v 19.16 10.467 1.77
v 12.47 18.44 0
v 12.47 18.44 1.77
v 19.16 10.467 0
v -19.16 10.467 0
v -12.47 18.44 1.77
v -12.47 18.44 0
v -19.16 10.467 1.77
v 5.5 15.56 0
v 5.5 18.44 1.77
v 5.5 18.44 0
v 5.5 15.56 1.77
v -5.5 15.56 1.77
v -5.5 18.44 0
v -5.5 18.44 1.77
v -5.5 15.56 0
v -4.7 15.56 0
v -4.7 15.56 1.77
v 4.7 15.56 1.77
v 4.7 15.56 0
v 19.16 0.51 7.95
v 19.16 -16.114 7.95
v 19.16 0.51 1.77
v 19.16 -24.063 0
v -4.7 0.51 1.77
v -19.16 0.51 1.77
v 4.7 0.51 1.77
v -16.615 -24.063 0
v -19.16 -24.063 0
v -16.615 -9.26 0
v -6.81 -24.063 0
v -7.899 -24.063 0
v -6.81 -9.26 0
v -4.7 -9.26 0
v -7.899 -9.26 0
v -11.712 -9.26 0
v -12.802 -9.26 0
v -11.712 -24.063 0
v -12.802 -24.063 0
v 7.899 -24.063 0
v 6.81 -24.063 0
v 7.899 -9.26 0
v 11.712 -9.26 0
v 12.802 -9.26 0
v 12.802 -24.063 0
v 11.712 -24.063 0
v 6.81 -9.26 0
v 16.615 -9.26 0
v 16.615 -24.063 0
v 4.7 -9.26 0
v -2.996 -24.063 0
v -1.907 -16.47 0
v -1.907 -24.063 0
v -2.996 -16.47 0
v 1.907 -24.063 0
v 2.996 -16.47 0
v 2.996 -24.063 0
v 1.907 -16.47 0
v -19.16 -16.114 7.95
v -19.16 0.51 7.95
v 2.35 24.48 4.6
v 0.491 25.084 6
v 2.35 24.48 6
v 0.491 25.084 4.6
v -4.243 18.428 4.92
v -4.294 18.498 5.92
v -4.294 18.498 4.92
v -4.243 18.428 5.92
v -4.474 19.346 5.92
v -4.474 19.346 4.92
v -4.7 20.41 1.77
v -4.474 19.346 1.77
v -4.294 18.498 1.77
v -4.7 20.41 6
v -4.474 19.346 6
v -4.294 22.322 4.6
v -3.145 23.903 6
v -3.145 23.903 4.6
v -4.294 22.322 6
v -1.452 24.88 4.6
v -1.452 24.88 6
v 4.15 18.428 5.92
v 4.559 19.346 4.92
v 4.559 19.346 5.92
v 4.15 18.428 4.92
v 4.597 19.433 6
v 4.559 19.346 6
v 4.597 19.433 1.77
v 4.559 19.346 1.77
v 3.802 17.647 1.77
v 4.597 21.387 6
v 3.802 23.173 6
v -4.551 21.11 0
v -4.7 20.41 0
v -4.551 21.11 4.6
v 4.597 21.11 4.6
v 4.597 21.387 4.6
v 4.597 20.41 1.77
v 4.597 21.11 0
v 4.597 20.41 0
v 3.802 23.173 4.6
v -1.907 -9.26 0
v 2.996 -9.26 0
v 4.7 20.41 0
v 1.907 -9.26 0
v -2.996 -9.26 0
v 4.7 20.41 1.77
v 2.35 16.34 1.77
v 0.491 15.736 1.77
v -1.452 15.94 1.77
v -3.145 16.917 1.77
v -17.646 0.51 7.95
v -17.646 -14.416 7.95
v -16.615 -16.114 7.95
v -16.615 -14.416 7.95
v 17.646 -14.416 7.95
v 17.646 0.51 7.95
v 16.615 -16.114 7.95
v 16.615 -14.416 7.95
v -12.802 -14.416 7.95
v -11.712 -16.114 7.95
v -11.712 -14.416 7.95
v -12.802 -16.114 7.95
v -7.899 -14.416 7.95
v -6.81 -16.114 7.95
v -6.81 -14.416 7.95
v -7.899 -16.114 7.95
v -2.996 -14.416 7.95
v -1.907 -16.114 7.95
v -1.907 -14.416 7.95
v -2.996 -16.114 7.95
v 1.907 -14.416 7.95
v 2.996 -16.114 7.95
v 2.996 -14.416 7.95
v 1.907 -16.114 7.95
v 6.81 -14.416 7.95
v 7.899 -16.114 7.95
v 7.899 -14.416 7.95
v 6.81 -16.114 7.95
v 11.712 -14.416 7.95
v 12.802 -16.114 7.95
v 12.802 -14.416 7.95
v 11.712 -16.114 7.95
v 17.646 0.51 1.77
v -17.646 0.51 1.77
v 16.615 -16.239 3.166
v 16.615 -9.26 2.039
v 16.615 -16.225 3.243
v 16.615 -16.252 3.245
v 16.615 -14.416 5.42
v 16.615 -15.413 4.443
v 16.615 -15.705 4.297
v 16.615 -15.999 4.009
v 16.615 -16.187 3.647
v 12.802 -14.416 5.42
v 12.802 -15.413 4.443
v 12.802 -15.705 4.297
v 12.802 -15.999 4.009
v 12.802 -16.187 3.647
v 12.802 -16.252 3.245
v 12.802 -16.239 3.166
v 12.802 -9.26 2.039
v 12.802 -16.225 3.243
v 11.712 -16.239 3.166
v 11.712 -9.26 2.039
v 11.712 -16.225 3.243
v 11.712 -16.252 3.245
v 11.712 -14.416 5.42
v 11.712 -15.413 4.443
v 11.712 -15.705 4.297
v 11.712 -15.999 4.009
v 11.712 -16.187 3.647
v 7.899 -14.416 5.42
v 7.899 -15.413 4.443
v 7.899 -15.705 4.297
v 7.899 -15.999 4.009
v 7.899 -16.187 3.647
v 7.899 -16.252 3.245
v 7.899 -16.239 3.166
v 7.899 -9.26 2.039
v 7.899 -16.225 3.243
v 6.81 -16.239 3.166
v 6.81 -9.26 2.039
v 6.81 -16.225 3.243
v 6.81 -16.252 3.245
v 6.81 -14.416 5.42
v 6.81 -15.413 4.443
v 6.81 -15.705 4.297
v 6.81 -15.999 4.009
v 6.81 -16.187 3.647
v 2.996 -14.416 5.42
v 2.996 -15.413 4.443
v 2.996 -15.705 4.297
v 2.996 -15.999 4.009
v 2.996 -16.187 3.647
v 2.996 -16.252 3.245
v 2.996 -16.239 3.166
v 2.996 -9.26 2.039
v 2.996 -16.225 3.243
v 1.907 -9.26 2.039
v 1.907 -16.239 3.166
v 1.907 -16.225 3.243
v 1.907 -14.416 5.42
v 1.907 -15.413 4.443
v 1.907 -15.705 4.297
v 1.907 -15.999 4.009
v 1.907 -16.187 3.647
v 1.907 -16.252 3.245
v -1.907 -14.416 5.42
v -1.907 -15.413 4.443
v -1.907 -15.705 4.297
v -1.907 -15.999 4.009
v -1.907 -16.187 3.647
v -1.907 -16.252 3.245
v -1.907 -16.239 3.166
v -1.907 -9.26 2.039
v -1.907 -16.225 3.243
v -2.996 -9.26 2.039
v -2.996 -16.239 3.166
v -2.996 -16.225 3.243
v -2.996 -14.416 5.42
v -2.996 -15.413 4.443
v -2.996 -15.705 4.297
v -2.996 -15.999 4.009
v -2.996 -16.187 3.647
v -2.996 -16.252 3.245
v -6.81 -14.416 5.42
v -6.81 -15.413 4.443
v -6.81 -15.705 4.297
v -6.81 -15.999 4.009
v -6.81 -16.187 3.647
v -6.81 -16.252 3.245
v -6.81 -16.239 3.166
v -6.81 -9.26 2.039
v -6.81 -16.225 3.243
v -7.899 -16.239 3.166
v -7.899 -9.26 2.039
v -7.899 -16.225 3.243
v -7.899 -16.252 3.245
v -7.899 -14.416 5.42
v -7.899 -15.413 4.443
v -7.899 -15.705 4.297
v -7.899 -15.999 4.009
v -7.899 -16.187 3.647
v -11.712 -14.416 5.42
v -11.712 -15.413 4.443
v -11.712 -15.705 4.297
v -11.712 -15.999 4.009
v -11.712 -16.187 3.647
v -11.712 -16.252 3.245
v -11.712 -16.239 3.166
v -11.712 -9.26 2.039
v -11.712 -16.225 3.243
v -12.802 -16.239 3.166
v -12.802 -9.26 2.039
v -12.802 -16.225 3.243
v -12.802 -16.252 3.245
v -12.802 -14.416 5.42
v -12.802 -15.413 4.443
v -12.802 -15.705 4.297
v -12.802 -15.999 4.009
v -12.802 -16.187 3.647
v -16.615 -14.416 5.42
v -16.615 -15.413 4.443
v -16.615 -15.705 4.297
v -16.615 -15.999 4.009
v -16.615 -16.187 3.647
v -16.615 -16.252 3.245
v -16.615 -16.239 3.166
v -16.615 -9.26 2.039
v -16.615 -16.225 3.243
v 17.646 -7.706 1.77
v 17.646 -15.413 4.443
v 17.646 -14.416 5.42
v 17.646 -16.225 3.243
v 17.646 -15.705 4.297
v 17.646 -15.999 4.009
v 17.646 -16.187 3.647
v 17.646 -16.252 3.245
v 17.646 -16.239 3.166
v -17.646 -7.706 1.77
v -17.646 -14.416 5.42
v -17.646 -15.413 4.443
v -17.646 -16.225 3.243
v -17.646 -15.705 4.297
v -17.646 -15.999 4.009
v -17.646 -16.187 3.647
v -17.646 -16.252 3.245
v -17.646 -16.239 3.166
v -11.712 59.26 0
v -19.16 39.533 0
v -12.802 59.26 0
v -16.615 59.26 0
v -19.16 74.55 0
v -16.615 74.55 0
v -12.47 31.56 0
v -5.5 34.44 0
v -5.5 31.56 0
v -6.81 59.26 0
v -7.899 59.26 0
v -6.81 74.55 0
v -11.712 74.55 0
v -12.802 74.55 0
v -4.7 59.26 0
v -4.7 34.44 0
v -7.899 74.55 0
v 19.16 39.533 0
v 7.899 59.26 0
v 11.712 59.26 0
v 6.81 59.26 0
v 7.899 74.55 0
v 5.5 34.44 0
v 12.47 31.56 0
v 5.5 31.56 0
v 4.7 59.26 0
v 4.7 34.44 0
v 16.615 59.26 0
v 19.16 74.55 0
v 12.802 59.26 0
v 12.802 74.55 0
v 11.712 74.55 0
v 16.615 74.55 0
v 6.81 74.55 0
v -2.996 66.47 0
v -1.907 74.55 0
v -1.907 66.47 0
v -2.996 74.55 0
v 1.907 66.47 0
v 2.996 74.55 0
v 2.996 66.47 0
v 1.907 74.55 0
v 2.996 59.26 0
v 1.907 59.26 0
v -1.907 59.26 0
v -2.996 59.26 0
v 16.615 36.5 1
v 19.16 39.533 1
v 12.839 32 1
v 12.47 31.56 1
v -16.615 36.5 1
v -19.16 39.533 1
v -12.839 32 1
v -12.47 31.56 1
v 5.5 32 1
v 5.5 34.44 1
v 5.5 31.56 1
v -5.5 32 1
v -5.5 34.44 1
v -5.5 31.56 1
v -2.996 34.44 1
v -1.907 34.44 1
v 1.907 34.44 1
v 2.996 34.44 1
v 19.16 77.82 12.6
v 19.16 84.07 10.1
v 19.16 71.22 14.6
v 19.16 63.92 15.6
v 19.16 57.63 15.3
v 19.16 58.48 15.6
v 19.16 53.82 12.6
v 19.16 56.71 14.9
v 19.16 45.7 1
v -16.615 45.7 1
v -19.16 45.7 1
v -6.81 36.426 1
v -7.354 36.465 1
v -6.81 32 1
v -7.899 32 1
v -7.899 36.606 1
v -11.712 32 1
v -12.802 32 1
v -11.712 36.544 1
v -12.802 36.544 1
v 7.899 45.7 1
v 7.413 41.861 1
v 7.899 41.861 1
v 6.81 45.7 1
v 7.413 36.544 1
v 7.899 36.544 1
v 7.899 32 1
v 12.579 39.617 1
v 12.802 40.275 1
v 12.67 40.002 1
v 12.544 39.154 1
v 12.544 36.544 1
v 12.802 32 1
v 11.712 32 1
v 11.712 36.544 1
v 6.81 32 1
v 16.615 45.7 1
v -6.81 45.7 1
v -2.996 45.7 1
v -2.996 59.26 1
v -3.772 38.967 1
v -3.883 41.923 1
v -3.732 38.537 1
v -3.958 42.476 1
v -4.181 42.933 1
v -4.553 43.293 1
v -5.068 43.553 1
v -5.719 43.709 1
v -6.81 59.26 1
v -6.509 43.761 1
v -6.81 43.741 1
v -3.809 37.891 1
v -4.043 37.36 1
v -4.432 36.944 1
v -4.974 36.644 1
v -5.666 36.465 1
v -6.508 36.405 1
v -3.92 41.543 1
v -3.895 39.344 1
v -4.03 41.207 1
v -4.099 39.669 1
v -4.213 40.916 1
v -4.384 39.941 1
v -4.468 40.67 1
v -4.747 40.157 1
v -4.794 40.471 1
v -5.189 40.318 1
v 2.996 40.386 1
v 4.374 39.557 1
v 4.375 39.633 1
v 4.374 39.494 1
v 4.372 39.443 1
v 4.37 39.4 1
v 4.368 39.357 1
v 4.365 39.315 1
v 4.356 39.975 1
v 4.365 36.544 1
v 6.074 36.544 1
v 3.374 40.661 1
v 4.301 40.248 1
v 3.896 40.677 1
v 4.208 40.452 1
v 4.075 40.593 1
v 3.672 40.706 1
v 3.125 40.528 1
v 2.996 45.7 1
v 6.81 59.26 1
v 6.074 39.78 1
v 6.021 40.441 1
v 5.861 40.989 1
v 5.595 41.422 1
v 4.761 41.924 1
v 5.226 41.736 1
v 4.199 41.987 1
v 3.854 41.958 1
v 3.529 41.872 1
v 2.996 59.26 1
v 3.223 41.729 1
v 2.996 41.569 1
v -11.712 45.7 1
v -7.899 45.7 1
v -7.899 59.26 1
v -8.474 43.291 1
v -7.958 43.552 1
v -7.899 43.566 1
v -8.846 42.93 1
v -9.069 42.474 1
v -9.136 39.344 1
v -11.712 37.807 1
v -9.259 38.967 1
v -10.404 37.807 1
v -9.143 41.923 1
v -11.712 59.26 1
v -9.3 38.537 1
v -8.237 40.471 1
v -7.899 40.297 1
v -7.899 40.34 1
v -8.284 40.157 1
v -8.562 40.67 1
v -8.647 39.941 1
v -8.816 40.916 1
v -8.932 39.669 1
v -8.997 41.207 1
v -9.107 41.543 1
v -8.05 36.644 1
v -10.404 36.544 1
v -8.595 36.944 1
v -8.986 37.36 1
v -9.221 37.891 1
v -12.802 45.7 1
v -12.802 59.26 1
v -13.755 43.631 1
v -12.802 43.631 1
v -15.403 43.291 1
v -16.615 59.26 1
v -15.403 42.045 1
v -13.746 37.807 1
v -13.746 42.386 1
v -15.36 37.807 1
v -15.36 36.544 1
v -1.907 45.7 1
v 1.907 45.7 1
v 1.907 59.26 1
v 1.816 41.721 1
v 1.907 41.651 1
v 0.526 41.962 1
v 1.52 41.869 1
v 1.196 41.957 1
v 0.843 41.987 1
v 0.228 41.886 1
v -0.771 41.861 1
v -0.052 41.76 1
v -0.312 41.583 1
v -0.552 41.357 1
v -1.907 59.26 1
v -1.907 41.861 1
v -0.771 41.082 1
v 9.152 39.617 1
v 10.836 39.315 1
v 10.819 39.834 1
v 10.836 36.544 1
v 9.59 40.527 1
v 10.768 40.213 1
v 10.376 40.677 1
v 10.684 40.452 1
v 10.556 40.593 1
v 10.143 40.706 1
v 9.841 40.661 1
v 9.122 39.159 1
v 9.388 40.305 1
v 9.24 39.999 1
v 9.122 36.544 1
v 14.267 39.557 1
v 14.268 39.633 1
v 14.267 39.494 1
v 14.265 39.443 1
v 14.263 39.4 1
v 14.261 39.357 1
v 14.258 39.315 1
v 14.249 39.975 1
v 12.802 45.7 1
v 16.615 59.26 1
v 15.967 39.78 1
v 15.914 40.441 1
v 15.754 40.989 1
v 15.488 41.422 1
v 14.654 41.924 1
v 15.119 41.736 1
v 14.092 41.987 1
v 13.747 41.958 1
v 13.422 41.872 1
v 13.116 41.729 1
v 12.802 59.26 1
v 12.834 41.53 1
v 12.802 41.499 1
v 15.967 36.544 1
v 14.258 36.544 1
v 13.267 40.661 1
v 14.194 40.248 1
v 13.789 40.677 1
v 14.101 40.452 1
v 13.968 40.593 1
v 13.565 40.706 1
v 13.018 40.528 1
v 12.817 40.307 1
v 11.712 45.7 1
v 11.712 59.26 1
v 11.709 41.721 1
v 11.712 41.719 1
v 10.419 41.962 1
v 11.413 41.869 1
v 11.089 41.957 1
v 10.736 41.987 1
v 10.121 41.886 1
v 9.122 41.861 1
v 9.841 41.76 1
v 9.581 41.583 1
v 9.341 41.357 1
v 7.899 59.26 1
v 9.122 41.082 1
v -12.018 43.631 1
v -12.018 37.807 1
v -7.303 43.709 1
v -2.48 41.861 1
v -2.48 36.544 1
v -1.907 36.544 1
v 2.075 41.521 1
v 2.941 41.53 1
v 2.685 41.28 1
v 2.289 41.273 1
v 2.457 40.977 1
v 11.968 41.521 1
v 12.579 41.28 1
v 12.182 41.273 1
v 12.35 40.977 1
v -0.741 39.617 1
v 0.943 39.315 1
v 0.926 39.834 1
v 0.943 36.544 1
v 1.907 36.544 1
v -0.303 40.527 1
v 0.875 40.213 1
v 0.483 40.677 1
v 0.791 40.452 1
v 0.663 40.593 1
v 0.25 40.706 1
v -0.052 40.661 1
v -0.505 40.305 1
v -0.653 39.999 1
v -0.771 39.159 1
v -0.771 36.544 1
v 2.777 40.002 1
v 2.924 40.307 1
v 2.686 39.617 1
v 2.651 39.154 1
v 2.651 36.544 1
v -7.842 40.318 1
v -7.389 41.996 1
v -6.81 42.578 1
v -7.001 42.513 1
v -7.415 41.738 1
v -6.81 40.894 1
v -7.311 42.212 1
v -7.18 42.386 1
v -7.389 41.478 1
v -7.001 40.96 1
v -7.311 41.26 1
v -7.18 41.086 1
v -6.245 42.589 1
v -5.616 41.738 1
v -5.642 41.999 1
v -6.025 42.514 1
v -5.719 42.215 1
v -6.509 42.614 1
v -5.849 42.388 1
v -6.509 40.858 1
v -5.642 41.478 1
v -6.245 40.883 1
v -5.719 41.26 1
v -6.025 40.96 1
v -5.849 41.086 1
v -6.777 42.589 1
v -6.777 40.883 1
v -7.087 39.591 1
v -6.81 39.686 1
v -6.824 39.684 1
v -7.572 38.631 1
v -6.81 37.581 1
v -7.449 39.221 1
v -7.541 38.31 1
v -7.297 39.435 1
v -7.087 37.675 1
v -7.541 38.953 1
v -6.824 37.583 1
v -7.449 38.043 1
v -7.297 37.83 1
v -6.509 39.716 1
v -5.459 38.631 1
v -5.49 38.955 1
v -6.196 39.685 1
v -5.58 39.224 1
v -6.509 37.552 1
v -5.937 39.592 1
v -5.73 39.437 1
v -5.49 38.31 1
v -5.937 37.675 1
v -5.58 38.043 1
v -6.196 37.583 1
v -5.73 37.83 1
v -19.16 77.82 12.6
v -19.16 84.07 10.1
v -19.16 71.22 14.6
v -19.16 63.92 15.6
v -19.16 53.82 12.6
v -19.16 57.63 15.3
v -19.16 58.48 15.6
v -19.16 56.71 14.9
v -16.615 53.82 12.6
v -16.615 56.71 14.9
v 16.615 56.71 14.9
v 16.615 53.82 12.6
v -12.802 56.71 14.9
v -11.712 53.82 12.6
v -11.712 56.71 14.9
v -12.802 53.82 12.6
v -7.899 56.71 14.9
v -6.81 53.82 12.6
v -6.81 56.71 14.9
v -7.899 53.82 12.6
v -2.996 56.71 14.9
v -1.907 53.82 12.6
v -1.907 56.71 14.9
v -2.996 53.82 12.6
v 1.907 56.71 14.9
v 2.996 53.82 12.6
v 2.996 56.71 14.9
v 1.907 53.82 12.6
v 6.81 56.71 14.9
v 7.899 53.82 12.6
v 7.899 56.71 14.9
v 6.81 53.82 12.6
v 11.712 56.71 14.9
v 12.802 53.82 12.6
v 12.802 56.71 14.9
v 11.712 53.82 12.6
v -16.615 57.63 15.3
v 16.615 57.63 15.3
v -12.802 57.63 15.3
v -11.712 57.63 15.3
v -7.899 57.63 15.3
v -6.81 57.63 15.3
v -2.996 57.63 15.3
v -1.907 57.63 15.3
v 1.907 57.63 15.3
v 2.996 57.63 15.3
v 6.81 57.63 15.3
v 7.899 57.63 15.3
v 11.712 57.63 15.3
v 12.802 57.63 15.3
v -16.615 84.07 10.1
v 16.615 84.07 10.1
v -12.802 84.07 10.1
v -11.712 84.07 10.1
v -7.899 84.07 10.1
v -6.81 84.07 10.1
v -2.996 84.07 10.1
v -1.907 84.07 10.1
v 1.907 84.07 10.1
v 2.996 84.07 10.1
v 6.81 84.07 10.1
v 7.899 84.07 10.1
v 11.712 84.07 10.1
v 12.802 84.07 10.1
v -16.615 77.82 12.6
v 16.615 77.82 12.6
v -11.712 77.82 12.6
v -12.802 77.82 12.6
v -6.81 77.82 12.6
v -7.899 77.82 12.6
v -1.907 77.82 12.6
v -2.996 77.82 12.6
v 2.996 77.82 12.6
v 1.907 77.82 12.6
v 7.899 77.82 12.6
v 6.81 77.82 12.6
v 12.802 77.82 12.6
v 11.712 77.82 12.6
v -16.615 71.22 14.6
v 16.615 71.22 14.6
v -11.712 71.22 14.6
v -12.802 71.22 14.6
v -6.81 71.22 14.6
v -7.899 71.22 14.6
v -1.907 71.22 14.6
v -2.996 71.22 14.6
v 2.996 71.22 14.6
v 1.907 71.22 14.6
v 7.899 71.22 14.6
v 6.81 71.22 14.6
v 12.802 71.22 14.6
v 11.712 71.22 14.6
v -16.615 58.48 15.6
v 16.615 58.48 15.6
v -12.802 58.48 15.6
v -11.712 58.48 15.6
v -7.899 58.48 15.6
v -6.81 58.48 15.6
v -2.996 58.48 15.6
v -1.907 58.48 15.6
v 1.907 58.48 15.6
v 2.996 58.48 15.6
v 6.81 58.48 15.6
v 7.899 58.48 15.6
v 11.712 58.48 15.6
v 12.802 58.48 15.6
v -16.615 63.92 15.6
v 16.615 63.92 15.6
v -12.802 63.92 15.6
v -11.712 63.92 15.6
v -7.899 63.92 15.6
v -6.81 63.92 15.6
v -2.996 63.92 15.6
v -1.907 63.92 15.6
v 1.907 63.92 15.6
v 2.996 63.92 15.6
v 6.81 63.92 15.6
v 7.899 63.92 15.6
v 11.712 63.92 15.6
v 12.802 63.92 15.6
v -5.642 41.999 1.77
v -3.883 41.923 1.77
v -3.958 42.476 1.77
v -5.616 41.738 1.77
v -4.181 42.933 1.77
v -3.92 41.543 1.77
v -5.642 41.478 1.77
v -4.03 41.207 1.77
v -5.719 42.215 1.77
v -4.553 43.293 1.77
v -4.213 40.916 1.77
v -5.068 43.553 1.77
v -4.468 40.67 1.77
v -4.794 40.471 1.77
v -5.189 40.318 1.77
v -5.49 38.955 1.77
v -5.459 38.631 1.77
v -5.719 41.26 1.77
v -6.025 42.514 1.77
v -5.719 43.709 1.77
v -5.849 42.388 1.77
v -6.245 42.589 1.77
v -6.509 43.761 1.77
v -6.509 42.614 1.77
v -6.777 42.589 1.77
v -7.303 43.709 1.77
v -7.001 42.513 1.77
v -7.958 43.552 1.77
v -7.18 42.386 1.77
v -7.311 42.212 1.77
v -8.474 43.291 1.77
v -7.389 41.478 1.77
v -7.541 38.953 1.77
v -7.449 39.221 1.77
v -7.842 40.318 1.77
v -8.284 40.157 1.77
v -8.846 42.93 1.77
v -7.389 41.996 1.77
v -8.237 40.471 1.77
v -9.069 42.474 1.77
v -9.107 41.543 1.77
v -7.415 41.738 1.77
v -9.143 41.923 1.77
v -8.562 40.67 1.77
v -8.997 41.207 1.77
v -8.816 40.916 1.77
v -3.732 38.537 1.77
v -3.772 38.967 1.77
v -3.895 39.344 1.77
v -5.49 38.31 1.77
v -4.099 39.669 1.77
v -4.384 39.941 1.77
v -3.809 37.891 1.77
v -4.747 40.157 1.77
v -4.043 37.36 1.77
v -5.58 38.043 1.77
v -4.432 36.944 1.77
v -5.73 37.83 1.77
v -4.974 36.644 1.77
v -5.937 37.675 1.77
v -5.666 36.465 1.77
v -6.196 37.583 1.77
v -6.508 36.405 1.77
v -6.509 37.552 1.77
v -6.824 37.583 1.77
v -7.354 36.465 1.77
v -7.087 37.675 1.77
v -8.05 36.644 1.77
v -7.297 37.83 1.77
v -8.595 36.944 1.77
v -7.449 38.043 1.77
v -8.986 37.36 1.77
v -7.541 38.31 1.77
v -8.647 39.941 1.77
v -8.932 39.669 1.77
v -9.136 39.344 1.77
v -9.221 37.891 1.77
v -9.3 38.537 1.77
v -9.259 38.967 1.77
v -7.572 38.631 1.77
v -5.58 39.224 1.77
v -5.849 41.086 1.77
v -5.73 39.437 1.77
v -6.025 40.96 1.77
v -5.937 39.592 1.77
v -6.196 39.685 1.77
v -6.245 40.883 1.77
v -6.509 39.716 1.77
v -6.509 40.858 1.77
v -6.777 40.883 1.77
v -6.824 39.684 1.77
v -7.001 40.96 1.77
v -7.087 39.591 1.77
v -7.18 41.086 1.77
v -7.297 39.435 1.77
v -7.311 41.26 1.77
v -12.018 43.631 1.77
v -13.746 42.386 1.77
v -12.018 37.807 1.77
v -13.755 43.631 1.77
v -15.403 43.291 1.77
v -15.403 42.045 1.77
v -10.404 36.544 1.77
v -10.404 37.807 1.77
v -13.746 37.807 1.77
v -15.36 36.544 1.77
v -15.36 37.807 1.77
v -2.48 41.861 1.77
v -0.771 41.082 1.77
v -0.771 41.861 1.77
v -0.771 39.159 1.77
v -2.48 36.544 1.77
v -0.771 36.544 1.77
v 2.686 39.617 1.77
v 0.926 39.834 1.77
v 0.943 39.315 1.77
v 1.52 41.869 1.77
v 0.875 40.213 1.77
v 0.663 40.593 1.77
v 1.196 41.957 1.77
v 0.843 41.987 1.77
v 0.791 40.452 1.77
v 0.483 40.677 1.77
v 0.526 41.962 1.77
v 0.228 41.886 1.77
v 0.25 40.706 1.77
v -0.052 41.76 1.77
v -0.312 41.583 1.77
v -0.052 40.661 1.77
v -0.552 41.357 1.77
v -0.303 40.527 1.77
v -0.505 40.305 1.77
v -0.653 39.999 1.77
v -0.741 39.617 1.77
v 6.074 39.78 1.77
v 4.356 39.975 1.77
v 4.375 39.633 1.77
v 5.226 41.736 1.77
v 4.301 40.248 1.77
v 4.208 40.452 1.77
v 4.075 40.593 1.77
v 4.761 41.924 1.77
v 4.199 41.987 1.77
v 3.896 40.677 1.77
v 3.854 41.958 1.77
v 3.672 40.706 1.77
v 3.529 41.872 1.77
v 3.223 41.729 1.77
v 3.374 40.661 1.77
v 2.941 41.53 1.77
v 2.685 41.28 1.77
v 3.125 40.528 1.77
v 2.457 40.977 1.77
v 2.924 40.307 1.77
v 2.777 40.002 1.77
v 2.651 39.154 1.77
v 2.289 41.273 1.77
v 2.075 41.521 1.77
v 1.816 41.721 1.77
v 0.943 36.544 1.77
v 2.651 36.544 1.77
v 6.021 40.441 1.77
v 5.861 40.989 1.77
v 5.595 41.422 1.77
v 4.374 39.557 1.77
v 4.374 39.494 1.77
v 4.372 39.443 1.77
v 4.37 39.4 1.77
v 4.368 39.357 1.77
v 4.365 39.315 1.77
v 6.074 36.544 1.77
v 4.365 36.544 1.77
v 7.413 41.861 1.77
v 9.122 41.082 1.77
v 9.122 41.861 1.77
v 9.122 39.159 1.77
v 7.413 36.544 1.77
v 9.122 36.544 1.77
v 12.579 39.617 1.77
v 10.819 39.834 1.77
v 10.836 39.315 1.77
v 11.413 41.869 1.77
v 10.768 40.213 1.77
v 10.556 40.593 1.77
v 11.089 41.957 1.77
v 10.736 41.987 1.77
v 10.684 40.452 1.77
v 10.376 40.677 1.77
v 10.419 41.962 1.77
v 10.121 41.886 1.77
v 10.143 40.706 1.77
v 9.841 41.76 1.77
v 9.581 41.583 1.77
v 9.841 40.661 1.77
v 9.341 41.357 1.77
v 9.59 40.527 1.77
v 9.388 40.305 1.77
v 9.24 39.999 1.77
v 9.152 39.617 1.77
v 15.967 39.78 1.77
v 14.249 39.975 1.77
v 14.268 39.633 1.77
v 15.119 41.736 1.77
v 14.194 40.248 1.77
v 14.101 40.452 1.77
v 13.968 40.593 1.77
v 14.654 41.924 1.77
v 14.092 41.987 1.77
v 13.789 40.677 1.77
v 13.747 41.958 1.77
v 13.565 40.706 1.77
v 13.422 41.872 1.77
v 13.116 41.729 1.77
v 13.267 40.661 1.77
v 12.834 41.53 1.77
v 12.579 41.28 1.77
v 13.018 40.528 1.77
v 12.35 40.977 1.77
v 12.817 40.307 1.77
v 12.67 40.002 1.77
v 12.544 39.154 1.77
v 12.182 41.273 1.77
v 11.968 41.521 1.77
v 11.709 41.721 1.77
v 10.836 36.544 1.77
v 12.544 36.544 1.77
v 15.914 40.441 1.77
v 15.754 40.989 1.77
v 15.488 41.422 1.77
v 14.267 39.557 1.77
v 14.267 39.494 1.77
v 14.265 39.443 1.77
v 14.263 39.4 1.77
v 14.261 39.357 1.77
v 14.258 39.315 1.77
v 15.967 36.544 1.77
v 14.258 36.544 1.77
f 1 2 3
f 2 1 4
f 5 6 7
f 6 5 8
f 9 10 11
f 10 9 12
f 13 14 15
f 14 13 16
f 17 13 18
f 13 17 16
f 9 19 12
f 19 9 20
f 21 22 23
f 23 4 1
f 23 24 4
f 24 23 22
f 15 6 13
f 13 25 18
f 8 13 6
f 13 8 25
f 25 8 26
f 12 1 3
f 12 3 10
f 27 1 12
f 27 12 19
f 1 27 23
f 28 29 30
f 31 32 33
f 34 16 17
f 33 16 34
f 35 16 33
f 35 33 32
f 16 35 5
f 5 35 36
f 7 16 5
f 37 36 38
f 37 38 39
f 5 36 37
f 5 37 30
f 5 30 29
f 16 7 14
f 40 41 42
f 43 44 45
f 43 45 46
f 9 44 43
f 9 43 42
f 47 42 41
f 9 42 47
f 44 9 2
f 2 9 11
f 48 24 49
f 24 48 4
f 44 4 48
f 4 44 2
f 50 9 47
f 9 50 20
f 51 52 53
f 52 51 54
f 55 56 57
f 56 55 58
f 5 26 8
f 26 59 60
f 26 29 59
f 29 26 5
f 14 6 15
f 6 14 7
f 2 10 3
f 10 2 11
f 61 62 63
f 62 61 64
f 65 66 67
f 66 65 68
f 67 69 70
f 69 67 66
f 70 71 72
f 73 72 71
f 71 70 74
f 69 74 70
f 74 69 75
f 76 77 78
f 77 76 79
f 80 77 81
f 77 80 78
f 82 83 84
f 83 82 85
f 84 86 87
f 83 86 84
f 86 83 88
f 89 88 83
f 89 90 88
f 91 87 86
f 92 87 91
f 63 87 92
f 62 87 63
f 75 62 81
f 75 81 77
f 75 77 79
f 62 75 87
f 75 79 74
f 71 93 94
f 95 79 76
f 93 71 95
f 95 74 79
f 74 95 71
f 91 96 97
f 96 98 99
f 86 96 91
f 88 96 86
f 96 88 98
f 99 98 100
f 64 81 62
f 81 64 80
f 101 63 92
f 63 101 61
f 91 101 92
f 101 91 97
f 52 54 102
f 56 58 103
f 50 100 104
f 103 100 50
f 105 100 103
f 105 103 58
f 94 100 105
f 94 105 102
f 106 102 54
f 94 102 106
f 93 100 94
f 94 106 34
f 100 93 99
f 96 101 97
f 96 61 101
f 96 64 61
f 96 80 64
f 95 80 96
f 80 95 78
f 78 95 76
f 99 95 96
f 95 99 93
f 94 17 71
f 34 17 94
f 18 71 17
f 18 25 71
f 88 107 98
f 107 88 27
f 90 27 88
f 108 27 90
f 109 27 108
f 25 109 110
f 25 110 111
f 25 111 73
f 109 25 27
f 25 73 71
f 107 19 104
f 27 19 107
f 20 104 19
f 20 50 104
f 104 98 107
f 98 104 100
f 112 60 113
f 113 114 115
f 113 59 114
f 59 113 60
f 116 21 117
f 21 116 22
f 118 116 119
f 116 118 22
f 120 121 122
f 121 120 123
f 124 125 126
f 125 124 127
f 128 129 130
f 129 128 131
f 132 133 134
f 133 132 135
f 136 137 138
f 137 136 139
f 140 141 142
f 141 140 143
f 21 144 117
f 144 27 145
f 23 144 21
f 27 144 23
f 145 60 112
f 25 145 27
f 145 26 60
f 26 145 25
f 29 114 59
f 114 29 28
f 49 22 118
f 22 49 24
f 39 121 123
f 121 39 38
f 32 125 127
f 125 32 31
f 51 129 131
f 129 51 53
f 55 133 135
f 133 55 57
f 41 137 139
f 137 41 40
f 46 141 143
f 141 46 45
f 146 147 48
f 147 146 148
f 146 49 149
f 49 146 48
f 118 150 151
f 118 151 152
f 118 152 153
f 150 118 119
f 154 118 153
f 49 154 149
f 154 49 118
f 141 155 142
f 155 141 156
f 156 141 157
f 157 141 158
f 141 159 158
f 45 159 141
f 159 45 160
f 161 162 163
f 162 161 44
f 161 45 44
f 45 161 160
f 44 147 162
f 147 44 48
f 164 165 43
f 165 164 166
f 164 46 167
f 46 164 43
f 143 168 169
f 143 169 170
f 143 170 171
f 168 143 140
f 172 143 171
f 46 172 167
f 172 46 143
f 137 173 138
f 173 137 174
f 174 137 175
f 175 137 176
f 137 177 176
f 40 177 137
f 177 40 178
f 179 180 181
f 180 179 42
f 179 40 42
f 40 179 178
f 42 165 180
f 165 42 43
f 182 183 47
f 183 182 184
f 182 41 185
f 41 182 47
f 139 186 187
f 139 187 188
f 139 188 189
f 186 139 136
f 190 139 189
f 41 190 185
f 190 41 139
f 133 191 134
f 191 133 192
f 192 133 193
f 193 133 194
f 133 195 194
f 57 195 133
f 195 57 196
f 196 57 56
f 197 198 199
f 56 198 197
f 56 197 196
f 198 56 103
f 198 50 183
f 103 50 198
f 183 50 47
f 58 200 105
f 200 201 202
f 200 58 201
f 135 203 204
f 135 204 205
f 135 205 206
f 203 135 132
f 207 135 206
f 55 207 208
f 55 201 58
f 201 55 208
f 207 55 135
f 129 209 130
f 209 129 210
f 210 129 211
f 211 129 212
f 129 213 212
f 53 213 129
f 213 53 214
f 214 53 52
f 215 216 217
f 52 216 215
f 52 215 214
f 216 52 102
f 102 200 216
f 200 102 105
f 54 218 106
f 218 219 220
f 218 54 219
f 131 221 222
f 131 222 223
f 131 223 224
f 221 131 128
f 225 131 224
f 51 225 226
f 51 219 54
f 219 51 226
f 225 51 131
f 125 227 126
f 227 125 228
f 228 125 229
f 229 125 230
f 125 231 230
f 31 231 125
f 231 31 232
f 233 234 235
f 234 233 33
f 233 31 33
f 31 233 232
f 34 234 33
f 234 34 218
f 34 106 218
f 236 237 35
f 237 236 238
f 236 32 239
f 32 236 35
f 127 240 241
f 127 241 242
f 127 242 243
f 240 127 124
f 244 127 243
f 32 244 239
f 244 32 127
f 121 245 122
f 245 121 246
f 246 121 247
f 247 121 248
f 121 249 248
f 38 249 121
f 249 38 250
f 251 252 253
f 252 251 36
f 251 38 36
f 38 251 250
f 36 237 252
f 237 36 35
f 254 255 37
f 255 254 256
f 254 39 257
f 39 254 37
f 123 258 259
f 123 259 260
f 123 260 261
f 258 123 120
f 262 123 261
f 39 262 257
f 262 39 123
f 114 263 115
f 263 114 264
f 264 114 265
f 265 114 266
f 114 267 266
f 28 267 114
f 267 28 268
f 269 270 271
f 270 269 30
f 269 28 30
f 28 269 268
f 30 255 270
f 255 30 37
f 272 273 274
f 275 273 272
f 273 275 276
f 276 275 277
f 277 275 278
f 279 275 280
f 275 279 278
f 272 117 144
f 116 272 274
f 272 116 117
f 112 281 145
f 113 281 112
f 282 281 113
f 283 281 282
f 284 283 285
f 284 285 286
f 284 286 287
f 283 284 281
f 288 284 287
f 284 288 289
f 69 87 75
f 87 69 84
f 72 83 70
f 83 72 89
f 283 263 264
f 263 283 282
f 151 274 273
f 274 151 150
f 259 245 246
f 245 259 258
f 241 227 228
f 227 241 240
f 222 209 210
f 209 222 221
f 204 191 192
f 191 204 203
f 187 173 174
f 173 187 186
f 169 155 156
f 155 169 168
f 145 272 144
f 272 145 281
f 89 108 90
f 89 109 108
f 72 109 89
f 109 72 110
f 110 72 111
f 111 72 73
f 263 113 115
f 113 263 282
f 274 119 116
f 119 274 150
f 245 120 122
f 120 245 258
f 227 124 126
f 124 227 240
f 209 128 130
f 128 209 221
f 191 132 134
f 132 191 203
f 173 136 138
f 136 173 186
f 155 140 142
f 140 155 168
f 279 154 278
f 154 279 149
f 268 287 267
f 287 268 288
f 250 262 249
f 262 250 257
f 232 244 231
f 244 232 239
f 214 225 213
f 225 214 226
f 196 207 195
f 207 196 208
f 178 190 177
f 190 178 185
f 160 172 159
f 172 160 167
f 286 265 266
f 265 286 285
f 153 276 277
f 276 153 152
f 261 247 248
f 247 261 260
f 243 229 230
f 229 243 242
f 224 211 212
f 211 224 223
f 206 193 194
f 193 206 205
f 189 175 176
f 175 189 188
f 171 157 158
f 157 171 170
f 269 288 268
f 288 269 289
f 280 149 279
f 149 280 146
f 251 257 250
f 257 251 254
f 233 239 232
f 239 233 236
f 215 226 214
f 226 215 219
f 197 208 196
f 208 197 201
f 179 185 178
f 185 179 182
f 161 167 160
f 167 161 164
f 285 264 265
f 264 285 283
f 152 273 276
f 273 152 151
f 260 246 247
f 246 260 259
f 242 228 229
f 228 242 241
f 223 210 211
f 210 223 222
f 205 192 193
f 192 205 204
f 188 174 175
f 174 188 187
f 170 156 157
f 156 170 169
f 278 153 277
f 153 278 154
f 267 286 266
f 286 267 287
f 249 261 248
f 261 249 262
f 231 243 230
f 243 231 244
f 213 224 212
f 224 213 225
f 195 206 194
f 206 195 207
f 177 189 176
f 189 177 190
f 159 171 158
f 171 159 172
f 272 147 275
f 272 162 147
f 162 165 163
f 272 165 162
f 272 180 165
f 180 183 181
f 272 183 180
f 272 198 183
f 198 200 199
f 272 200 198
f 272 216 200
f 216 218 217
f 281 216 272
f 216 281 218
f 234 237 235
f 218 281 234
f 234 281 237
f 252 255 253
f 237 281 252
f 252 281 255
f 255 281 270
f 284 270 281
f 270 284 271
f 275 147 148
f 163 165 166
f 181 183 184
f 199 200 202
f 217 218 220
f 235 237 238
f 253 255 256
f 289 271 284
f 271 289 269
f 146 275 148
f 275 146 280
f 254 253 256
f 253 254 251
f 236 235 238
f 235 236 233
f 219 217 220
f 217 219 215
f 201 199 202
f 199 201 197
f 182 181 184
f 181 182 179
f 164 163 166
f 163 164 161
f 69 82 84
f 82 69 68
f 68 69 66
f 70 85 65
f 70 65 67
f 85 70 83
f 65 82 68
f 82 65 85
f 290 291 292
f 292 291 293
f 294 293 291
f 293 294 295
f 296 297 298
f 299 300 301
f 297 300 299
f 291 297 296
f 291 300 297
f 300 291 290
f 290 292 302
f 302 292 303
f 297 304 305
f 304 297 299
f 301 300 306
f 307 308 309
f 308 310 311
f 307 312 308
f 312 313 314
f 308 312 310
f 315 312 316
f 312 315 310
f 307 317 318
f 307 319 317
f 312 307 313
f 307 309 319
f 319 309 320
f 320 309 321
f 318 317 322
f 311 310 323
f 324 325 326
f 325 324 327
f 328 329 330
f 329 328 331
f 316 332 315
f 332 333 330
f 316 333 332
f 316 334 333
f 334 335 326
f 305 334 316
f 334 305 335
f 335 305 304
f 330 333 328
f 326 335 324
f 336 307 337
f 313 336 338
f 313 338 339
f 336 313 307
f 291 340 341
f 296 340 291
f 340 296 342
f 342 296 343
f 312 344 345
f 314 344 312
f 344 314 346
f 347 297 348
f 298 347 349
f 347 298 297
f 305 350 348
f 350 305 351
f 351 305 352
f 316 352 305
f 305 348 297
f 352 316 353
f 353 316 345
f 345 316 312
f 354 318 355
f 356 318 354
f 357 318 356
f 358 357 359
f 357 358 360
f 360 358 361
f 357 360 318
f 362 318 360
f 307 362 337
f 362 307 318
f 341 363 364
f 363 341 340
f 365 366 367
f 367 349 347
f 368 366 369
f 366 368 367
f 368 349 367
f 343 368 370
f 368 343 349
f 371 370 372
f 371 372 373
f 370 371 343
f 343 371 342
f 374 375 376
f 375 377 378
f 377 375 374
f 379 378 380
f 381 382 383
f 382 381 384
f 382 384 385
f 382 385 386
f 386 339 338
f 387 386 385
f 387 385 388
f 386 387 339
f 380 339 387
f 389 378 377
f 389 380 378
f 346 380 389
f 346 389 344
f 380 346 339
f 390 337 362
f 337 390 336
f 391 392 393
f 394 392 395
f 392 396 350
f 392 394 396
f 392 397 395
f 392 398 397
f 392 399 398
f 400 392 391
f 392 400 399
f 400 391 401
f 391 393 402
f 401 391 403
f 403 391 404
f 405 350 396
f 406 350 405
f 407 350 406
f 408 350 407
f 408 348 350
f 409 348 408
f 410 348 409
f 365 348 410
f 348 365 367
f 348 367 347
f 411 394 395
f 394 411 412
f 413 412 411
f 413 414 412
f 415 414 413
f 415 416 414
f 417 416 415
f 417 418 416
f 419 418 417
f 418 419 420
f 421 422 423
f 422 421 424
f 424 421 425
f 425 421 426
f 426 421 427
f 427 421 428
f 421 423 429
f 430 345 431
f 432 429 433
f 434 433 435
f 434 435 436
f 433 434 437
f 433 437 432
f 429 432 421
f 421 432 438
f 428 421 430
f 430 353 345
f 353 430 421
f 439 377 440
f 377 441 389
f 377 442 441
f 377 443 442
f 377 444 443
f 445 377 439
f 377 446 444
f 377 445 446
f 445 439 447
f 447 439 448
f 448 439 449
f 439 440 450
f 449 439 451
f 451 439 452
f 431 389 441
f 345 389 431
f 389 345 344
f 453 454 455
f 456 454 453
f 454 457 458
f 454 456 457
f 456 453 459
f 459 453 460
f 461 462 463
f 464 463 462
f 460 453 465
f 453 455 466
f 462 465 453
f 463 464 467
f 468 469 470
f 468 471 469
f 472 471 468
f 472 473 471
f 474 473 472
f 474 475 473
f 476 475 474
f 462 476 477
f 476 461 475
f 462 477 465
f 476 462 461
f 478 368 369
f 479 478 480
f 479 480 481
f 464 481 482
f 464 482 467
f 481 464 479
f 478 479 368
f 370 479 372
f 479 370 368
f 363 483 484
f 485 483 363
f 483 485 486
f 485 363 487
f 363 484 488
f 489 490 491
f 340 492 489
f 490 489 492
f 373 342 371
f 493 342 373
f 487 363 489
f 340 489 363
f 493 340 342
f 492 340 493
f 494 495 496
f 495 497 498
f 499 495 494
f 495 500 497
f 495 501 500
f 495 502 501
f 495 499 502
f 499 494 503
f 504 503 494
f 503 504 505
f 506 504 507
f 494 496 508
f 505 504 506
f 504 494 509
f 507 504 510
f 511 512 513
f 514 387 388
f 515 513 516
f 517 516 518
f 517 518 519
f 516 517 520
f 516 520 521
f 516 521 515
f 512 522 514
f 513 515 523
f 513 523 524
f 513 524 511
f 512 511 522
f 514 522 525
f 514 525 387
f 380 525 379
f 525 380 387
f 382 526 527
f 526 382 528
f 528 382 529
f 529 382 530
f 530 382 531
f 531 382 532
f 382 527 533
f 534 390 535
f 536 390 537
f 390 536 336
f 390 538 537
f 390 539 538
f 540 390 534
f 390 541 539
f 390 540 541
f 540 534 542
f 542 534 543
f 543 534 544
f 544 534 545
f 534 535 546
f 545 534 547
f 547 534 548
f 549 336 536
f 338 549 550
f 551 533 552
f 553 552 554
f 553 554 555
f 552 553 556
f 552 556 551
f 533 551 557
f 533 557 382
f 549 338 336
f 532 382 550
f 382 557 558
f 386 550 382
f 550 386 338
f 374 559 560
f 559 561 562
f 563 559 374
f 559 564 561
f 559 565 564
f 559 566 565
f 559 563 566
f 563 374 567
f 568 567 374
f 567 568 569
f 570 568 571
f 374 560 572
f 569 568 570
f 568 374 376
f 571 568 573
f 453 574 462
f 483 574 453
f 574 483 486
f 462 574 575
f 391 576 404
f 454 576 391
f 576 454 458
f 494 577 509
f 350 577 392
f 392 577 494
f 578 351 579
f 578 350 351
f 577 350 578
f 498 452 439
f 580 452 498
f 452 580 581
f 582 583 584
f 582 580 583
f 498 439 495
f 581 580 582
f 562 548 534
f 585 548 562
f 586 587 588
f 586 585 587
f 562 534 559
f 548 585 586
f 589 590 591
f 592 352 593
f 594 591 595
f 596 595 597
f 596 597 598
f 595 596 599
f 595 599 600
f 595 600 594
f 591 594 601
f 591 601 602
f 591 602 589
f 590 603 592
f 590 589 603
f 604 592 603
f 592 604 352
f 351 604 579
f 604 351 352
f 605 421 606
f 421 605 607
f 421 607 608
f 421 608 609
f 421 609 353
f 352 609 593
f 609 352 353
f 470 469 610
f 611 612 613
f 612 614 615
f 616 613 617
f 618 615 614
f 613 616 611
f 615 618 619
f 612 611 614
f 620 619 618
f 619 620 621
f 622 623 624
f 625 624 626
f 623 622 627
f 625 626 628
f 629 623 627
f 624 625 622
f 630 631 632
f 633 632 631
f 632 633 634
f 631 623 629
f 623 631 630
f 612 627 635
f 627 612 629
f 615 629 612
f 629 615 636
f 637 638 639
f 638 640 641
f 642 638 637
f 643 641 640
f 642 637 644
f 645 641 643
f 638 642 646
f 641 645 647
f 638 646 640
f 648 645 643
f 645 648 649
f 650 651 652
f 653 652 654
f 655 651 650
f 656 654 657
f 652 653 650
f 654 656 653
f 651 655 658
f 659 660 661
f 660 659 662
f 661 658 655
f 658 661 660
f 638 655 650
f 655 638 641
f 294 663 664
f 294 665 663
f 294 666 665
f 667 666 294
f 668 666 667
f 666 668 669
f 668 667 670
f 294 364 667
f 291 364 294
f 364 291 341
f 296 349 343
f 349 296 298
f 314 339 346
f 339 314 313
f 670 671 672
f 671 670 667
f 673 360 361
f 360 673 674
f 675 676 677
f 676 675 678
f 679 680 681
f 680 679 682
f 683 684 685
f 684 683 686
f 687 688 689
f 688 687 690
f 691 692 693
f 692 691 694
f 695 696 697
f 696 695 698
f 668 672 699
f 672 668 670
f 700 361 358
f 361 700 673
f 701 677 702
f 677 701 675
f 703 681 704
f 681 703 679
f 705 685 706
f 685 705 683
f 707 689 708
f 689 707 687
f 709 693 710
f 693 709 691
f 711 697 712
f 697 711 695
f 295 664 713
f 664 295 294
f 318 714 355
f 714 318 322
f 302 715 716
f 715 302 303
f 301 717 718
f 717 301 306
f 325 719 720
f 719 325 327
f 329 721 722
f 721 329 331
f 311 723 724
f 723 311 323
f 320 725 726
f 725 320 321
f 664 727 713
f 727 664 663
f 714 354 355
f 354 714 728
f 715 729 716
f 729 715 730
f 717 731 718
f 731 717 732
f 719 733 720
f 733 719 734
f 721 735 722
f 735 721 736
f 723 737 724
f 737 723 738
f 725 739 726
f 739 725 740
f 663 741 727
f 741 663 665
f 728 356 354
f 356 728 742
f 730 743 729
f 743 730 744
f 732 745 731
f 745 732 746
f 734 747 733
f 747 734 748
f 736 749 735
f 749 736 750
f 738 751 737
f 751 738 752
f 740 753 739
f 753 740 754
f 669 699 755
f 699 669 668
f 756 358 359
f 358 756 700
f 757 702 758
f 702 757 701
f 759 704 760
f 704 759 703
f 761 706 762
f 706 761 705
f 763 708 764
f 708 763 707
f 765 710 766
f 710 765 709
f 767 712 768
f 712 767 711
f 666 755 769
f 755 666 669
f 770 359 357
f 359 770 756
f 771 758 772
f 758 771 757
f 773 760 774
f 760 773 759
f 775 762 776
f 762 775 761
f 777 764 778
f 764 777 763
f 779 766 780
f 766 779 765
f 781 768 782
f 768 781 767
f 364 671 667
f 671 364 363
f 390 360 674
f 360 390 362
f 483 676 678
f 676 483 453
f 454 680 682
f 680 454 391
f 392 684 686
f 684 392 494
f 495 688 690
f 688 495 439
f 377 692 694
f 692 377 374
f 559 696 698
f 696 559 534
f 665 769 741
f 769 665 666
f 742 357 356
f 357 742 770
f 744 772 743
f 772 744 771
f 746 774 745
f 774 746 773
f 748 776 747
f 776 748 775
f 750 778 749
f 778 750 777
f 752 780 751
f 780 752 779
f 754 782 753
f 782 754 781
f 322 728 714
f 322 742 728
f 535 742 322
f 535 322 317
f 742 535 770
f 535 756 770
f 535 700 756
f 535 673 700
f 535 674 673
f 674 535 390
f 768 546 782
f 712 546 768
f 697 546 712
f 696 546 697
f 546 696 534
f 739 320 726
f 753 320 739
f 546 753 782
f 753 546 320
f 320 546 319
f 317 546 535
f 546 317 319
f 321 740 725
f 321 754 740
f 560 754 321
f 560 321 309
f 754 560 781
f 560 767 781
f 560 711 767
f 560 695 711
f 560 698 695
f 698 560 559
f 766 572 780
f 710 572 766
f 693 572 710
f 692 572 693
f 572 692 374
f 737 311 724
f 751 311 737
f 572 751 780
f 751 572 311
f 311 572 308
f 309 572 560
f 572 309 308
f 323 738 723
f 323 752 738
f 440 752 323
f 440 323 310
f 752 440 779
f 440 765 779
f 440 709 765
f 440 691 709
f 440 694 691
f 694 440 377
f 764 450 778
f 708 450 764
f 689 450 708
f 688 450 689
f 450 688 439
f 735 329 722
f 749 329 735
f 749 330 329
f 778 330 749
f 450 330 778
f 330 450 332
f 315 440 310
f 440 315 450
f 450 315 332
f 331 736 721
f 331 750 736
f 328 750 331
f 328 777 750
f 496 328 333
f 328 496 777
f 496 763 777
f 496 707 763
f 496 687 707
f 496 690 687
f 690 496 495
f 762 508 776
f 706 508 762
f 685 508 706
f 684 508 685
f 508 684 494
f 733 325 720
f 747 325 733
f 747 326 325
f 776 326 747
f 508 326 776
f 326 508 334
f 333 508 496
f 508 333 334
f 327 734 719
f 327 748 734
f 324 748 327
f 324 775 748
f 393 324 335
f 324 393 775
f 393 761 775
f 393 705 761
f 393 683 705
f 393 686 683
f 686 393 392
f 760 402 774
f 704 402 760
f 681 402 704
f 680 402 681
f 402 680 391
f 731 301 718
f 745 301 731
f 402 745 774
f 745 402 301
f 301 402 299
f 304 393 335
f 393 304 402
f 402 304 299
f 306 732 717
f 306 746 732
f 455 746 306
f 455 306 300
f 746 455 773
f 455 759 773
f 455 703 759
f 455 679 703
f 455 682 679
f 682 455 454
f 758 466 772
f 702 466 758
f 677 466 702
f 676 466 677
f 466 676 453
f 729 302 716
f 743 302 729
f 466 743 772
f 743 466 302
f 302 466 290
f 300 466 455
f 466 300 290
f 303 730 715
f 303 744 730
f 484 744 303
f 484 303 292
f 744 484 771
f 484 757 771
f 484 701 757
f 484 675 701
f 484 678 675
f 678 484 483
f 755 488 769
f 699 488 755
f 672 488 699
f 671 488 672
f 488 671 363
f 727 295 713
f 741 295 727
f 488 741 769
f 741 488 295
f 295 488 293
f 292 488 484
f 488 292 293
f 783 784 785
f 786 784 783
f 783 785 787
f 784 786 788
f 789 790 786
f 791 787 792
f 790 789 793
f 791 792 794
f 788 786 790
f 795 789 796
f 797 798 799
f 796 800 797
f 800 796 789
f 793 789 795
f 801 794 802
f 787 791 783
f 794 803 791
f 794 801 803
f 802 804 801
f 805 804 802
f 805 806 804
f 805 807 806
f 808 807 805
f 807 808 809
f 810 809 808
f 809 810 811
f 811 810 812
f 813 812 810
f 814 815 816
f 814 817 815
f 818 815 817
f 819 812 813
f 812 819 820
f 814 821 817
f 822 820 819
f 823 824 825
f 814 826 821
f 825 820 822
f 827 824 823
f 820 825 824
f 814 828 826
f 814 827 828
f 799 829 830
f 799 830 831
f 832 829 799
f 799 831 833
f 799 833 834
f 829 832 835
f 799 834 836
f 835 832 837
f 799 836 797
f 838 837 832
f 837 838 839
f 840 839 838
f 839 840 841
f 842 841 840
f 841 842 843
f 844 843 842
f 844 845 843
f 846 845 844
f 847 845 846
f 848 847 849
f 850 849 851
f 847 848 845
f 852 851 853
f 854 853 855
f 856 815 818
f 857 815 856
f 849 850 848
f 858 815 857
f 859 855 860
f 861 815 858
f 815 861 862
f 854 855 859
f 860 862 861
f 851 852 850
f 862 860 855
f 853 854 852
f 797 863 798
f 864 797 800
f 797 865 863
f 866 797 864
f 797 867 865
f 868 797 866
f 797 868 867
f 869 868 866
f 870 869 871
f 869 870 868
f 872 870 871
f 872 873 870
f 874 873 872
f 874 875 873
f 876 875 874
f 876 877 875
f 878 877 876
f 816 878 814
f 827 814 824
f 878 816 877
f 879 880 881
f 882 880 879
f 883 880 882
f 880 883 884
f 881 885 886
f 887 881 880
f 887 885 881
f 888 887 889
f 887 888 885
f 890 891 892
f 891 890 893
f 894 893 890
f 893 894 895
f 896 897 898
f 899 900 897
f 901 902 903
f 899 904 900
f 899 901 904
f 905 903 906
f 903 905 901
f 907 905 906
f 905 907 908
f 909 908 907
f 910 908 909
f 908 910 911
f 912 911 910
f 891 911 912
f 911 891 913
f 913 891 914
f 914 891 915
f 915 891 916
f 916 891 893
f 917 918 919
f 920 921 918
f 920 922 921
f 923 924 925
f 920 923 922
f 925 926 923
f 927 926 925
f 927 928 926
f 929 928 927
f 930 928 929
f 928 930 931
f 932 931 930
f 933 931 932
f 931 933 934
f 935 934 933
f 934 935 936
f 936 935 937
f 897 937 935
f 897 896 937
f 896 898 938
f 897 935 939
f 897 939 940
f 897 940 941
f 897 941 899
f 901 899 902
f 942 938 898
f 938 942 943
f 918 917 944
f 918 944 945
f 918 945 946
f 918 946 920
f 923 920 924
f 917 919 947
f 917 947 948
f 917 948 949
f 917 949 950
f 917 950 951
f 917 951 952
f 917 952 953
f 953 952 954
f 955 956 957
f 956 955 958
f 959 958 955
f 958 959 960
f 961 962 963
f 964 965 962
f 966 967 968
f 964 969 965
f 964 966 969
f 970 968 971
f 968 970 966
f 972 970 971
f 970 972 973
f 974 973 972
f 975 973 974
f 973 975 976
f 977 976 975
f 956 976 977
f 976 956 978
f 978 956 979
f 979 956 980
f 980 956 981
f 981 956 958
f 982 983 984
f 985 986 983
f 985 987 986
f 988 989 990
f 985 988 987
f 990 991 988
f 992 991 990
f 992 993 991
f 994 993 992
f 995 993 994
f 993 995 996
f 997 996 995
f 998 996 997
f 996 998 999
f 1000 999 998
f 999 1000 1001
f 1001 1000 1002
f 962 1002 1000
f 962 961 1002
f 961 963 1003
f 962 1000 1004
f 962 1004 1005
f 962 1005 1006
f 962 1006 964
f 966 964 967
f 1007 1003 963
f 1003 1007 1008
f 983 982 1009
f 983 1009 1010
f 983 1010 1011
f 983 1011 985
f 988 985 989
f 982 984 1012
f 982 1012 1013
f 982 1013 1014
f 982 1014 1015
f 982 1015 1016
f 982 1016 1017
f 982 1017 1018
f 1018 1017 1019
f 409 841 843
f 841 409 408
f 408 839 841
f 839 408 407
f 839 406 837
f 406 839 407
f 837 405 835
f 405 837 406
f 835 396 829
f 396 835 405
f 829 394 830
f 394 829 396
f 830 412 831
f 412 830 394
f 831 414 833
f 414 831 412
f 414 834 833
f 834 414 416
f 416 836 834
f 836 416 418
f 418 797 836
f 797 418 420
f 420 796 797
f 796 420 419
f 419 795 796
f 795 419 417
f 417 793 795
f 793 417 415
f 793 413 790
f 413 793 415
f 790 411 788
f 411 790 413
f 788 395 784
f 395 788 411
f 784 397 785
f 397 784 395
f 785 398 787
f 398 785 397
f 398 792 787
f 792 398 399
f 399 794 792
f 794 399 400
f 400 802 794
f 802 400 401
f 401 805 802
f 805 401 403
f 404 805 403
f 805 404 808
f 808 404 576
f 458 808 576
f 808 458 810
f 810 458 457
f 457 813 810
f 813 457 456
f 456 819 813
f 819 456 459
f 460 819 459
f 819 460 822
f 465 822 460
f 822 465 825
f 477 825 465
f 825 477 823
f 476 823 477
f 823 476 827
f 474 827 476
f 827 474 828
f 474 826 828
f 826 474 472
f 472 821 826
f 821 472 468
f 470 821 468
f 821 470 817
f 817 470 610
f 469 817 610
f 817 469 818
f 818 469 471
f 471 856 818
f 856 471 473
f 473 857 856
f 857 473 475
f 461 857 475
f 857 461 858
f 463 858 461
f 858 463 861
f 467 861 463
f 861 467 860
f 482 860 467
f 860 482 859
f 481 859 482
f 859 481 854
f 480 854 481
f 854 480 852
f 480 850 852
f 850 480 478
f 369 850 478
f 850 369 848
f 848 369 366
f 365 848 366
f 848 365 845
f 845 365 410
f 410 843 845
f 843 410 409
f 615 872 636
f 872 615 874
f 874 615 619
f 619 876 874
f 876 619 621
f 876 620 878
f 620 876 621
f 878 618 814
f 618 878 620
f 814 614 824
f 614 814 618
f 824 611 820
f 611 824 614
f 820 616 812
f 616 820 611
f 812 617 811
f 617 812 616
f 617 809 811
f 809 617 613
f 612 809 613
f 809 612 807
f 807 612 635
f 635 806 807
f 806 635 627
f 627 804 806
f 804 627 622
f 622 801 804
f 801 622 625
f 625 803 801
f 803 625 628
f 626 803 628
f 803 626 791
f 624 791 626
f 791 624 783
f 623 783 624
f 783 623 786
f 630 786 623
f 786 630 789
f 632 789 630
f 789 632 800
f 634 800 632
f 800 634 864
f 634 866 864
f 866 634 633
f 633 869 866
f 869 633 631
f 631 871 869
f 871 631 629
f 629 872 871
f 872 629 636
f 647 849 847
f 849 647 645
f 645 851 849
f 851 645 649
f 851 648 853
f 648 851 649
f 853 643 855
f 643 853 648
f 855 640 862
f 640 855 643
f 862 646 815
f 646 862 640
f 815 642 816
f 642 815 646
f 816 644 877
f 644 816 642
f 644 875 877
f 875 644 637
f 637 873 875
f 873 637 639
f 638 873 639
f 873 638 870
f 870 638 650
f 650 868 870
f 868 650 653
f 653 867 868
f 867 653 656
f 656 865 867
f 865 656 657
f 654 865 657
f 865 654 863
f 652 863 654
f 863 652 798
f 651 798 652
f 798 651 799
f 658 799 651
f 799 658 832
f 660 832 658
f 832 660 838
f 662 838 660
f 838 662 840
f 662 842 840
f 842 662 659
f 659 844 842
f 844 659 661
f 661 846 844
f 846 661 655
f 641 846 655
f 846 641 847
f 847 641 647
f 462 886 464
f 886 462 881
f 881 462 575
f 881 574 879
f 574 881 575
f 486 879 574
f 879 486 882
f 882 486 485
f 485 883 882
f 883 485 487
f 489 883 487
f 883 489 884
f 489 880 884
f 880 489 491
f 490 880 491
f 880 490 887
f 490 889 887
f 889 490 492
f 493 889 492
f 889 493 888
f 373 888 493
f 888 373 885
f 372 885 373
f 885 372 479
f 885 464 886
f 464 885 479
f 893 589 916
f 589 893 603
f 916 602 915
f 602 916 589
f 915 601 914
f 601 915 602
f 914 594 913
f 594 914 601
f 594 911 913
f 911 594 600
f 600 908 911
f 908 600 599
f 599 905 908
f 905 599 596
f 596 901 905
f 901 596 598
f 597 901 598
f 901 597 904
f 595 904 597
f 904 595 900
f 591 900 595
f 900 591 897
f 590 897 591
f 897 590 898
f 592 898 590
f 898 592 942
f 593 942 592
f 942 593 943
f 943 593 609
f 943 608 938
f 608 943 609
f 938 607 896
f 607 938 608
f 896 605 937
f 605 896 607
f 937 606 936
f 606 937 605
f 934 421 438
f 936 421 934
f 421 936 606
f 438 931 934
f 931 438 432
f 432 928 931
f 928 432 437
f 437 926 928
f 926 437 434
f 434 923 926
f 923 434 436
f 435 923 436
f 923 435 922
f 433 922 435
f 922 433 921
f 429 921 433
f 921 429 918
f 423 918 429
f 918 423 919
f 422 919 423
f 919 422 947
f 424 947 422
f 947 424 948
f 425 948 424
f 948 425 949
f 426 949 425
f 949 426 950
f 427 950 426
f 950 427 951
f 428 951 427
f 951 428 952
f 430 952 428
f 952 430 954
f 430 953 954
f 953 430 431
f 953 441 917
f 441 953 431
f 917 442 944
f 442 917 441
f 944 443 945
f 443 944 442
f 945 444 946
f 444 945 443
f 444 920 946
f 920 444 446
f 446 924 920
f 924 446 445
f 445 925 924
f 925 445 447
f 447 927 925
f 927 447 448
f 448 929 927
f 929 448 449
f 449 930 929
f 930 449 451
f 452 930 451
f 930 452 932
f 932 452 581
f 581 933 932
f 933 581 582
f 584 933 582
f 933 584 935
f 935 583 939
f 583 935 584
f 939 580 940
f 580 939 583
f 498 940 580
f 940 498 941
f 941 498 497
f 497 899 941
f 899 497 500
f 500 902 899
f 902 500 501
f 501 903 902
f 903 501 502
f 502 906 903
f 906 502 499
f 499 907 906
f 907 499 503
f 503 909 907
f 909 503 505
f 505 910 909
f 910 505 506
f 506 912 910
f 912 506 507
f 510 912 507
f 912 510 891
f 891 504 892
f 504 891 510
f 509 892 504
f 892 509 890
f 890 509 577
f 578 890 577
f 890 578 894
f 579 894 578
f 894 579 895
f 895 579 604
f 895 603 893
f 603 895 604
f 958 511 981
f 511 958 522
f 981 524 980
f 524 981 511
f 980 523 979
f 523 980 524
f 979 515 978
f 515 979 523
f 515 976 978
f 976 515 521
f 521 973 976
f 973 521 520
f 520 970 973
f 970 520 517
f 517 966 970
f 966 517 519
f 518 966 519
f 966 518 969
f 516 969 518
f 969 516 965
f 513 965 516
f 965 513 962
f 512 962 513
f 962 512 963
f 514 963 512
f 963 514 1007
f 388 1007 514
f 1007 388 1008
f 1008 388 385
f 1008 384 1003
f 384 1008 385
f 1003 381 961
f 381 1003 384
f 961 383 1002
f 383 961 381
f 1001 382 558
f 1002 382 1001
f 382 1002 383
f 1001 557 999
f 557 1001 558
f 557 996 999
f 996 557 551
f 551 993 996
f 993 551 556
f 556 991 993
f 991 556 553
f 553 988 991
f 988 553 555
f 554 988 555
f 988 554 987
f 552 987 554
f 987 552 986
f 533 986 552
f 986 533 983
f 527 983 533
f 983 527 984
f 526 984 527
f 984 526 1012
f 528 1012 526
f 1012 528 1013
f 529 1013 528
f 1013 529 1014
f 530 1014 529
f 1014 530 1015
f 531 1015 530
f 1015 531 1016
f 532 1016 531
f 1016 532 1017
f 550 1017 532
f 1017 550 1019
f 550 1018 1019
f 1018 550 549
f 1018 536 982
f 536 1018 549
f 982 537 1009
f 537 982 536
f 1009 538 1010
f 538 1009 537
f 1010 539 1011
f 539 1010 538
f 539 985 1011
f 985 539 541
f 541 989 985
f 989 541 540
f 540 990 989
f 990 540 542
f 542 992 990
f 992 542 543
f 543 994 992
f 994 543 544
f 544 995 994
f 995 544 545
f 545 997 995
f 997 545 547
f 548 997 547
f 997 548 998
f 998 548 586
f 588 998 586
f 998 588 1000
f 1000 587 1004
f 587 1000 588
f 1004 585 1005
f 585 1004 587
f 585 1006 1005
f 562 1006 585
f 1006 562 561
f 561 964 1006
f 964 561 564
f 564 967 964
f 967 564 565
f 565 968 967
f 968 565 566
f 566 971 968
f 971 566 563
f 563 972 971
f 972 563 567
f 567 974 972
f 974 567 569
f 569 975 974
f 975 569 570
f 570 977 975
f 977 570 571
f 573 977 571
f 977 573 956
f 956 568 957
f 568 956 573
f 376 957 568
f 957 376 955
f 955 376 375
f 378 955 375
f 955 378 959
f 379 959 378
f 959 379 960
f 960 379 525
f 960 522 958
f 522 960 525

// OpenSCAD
// A parametric guard for the Trym beard trimmer. The largest guard it comes with is 9mm which is
// not enough mms. This lets to have as many mms as you desire.
//
// First OpenSCAD project. Kind of a mess.

// The length to cut the hair in millimeters (measure twice, cut once though)
guard_height = 18;

/* Hidden */

base_width = 38.32;
base_length = 27.70+9.18;
base_thickness = 1.77;

base_notch_width= 11;
base_notch_length = 2.88;

root_width = 26.95;
root_height = 7.95-1.77+base_thickness;

module base_chamfer(dir) {
  translate([dir * (base_width/2), base_length/2, 0])
    rotate(a=dir*40, v=[0,0,1])
    cube([10.25, 10.25*2, base_thickness*2], center=true);
}


// Trym Guard Base
module trym_guard_base() {
  module base_core() {

    difference() {
      cube([base_width, base_length, base_thickness], center=true);
      union() {
        base_chamfer(1);
        base_chamfer(-1);
        translate([0, base_length/2, 0])
          cube([base_notch_width, base_notch_length*2, base_thickness*2], center=true);
      }
    }
  }

  module lock_tab() {
    lock_tab_offset = 1.97;
    lock_tab_width = 9.4;
    riser_length = 1.4;
    riser_height = 6.0;
    latch_sides = 1.25;

    translate([lock_tab_width/2, base_length/2+lock_tab_offset, -base_thickness/2])
      rotate(a=180, v=[0, 0, 1]) {
        cube([lock_tab_width, base_length, base_thickness]);
        difference() {
          translate([lock_tab_width/2, 0, 0]) cylinder(h=riser_height, d=lock_tab_width);
          union() {
            //translate([0, riser_length, base_thickness])
            //  cube([lock_tab_width, lock_tab_width, riser_height*2]);
            translate([0, -lock_tab_width-0.7, 0])
              cube([lock_tab_width, lock_tab_width, riser_height-riser_length]);
          }
        }
      }
  }

  module teeth_guard() {
    difference() {
      translate([0, -base_length/2 + root_width/2 - 8, -base_thickness/2+root_height/2])
        cube([base_width, root_width, root_height], center=true);
      union() {
        translate([0, -base_length/2-2, base_thickness/2+root_height/2+3.5])
          rotate(a=45, v=[1, 0, 0])
          cube([base_width, root_width, root_height], center=true);
      }
    }
  }

  translate([0, 0, base_thickness/2]) {
    difference() {
      union() {
        base_core();
        lock_tab();
        teeth_guard();
      }
      union() {
        for(i=[0:6]) {
          tooth_area_width = base_width-4;
          translate([tooth_area_width/2 - tooth_area_width/7*i - tooth_area_width/7/2, -base_length/2, root_height/2-base_thickness/2]) 
            cube([tooth_area_width/9, 9.18*2, 50], center=true);
        }
      }
    }
  }
}

head_length = 34.6;
head_width = 34.6;
head_thickness = 2.65;
module trym_head() {
  difference() {
    union() {
      translate([0, 1.1/4, 0]) cube([head_width, head_length-1.1/2, head_thickness], center=true);
      difference() {
        translate([0, 0.25, head_thickness/2+1/2])
          cube([head_width, head_length-0.5, 1], center=true);
        translate([-head_width/2, -head_length/2+0.5, head_thickness/2])
          rotate(a=45, v=[1, 0, 0])
          cube([head_width, 3, 3]);
      }
      translate([0, 0.75, head_thickness/2+1+10]) cube([head_width, head_length-1.5, 20], center=true);
      translate([0, -head_length/2 + 1, 0.15]) rotate(a=90, v=[0, 1, 0]) cylinder(d=2.6, h=head_width, center=true, $fn=20);
    }
    union() {
      translate([0, -head_length/2-0.3, 0])
        rotate(a=-10, v=[1, 0, 0])
        translate([-head_width/2, 0, -head_thickness-0.2])
        cube([head_width, 8.47+0.4, 3]);
      notch_depth = 0.9;
      notch_width = 9.5;
      translate([0, head_width/2-notch_depth/2, head_thickness/2+1]) cube([notch_width, notch_depth, 1], center=true);
    }
  }
}

module trym_base() {
  difference() {
    trym_guard_base();
    translate([0, 1.7, base_thickness + head_thickness/2])
      scale([1.02, 1.02, 1]) // wiggle room on the sides
      trym_head();
  }
}

module trym_teeth(height) {
  adjusted_height=height-2.4;
  rotate(a=180, v=[1, 0, 0])
    difference() {
      union() {
        difference() {
          union() {
            guard_base_length = 32;
            translate([0,5,0])
              rotate(a=90, v=[0, 0, 1])
              rotate(a=90, v=[1, 0, 0]) 
              translate([0,0,-base_width/2])
              linear_extrude(height=base_width) {
                // The "0.7" is the skew value; pushed along the y axis
                M = [ [ 1, 0.7, 0],
                  [ 0, 1, 0],
                  [ 0, 0, 1] ] ;
                multmatrix(M)
                  polygon([[0,0],
                      [-guard_base_length+2.45,0],
                      [-guard_base_length,-adjusted_height+5.5],
                      [-guard_base_length*0.75,-adjusted_height+3],
                      [-guard_base_length*0.50,-adjusted_height+1],
                      [-guard_base_length*0.25,-adjusted_height],
                      [-guard_base_length*0.08,-adjusted_height],
                      [-guard_base_length*0.06,-adjusted_height+0.3],
                      [-guard_base_length*0.04,-adjusted_height+0.7],
                      [0,-adjusted_height+3]]);

              }
            translate([0, 0, -1/2]) {
              difference() {
                cube([base_width, base_length, 1], center=true);
                union() {
                  base_chamfer(1);
                  base_chamfer(-1);
                  translate([0, base_length/2, 0])
                    cube([base_notch_width, base_notch_length*2, base_thickness*2], center=true);
                }
              }
            }
          }
          union() {
            for(i=[0:6]) {
              tooth_area_width = base_width-4;
              translate([tooth_area_width/2 - tooth_area_width/7*i - tooth_area_width/7/2, -base_length/2 - (9.18*18/2), root_height/2-base_thickness/2]) 
                cube([tooth_area_width/9, 9.18*20, 100], center=true);
              translate([tooth_area_width/2 - tooth_area_width/7*i - tooth_area_width/7/2, 0, -height/2-1]) 
                cube([tooth_area_width/9, height*2, height], center=true);
            }
          }
        }
        // text
        rotate(a=180, v=[0, 1, 0])
          translate([0, 10, 0])
          linear_extrude(height=base_thickness)
          rotate(a=180, v=[0, 0, 1])
          text(text = str(height, "mm"), font="Impact:style=Bold", size=7, halign="center", valign="center");
      }
      trym_base();
    }
}

trym_base();
translate([0, 50, 0]) trym_teeth(guard_height);
